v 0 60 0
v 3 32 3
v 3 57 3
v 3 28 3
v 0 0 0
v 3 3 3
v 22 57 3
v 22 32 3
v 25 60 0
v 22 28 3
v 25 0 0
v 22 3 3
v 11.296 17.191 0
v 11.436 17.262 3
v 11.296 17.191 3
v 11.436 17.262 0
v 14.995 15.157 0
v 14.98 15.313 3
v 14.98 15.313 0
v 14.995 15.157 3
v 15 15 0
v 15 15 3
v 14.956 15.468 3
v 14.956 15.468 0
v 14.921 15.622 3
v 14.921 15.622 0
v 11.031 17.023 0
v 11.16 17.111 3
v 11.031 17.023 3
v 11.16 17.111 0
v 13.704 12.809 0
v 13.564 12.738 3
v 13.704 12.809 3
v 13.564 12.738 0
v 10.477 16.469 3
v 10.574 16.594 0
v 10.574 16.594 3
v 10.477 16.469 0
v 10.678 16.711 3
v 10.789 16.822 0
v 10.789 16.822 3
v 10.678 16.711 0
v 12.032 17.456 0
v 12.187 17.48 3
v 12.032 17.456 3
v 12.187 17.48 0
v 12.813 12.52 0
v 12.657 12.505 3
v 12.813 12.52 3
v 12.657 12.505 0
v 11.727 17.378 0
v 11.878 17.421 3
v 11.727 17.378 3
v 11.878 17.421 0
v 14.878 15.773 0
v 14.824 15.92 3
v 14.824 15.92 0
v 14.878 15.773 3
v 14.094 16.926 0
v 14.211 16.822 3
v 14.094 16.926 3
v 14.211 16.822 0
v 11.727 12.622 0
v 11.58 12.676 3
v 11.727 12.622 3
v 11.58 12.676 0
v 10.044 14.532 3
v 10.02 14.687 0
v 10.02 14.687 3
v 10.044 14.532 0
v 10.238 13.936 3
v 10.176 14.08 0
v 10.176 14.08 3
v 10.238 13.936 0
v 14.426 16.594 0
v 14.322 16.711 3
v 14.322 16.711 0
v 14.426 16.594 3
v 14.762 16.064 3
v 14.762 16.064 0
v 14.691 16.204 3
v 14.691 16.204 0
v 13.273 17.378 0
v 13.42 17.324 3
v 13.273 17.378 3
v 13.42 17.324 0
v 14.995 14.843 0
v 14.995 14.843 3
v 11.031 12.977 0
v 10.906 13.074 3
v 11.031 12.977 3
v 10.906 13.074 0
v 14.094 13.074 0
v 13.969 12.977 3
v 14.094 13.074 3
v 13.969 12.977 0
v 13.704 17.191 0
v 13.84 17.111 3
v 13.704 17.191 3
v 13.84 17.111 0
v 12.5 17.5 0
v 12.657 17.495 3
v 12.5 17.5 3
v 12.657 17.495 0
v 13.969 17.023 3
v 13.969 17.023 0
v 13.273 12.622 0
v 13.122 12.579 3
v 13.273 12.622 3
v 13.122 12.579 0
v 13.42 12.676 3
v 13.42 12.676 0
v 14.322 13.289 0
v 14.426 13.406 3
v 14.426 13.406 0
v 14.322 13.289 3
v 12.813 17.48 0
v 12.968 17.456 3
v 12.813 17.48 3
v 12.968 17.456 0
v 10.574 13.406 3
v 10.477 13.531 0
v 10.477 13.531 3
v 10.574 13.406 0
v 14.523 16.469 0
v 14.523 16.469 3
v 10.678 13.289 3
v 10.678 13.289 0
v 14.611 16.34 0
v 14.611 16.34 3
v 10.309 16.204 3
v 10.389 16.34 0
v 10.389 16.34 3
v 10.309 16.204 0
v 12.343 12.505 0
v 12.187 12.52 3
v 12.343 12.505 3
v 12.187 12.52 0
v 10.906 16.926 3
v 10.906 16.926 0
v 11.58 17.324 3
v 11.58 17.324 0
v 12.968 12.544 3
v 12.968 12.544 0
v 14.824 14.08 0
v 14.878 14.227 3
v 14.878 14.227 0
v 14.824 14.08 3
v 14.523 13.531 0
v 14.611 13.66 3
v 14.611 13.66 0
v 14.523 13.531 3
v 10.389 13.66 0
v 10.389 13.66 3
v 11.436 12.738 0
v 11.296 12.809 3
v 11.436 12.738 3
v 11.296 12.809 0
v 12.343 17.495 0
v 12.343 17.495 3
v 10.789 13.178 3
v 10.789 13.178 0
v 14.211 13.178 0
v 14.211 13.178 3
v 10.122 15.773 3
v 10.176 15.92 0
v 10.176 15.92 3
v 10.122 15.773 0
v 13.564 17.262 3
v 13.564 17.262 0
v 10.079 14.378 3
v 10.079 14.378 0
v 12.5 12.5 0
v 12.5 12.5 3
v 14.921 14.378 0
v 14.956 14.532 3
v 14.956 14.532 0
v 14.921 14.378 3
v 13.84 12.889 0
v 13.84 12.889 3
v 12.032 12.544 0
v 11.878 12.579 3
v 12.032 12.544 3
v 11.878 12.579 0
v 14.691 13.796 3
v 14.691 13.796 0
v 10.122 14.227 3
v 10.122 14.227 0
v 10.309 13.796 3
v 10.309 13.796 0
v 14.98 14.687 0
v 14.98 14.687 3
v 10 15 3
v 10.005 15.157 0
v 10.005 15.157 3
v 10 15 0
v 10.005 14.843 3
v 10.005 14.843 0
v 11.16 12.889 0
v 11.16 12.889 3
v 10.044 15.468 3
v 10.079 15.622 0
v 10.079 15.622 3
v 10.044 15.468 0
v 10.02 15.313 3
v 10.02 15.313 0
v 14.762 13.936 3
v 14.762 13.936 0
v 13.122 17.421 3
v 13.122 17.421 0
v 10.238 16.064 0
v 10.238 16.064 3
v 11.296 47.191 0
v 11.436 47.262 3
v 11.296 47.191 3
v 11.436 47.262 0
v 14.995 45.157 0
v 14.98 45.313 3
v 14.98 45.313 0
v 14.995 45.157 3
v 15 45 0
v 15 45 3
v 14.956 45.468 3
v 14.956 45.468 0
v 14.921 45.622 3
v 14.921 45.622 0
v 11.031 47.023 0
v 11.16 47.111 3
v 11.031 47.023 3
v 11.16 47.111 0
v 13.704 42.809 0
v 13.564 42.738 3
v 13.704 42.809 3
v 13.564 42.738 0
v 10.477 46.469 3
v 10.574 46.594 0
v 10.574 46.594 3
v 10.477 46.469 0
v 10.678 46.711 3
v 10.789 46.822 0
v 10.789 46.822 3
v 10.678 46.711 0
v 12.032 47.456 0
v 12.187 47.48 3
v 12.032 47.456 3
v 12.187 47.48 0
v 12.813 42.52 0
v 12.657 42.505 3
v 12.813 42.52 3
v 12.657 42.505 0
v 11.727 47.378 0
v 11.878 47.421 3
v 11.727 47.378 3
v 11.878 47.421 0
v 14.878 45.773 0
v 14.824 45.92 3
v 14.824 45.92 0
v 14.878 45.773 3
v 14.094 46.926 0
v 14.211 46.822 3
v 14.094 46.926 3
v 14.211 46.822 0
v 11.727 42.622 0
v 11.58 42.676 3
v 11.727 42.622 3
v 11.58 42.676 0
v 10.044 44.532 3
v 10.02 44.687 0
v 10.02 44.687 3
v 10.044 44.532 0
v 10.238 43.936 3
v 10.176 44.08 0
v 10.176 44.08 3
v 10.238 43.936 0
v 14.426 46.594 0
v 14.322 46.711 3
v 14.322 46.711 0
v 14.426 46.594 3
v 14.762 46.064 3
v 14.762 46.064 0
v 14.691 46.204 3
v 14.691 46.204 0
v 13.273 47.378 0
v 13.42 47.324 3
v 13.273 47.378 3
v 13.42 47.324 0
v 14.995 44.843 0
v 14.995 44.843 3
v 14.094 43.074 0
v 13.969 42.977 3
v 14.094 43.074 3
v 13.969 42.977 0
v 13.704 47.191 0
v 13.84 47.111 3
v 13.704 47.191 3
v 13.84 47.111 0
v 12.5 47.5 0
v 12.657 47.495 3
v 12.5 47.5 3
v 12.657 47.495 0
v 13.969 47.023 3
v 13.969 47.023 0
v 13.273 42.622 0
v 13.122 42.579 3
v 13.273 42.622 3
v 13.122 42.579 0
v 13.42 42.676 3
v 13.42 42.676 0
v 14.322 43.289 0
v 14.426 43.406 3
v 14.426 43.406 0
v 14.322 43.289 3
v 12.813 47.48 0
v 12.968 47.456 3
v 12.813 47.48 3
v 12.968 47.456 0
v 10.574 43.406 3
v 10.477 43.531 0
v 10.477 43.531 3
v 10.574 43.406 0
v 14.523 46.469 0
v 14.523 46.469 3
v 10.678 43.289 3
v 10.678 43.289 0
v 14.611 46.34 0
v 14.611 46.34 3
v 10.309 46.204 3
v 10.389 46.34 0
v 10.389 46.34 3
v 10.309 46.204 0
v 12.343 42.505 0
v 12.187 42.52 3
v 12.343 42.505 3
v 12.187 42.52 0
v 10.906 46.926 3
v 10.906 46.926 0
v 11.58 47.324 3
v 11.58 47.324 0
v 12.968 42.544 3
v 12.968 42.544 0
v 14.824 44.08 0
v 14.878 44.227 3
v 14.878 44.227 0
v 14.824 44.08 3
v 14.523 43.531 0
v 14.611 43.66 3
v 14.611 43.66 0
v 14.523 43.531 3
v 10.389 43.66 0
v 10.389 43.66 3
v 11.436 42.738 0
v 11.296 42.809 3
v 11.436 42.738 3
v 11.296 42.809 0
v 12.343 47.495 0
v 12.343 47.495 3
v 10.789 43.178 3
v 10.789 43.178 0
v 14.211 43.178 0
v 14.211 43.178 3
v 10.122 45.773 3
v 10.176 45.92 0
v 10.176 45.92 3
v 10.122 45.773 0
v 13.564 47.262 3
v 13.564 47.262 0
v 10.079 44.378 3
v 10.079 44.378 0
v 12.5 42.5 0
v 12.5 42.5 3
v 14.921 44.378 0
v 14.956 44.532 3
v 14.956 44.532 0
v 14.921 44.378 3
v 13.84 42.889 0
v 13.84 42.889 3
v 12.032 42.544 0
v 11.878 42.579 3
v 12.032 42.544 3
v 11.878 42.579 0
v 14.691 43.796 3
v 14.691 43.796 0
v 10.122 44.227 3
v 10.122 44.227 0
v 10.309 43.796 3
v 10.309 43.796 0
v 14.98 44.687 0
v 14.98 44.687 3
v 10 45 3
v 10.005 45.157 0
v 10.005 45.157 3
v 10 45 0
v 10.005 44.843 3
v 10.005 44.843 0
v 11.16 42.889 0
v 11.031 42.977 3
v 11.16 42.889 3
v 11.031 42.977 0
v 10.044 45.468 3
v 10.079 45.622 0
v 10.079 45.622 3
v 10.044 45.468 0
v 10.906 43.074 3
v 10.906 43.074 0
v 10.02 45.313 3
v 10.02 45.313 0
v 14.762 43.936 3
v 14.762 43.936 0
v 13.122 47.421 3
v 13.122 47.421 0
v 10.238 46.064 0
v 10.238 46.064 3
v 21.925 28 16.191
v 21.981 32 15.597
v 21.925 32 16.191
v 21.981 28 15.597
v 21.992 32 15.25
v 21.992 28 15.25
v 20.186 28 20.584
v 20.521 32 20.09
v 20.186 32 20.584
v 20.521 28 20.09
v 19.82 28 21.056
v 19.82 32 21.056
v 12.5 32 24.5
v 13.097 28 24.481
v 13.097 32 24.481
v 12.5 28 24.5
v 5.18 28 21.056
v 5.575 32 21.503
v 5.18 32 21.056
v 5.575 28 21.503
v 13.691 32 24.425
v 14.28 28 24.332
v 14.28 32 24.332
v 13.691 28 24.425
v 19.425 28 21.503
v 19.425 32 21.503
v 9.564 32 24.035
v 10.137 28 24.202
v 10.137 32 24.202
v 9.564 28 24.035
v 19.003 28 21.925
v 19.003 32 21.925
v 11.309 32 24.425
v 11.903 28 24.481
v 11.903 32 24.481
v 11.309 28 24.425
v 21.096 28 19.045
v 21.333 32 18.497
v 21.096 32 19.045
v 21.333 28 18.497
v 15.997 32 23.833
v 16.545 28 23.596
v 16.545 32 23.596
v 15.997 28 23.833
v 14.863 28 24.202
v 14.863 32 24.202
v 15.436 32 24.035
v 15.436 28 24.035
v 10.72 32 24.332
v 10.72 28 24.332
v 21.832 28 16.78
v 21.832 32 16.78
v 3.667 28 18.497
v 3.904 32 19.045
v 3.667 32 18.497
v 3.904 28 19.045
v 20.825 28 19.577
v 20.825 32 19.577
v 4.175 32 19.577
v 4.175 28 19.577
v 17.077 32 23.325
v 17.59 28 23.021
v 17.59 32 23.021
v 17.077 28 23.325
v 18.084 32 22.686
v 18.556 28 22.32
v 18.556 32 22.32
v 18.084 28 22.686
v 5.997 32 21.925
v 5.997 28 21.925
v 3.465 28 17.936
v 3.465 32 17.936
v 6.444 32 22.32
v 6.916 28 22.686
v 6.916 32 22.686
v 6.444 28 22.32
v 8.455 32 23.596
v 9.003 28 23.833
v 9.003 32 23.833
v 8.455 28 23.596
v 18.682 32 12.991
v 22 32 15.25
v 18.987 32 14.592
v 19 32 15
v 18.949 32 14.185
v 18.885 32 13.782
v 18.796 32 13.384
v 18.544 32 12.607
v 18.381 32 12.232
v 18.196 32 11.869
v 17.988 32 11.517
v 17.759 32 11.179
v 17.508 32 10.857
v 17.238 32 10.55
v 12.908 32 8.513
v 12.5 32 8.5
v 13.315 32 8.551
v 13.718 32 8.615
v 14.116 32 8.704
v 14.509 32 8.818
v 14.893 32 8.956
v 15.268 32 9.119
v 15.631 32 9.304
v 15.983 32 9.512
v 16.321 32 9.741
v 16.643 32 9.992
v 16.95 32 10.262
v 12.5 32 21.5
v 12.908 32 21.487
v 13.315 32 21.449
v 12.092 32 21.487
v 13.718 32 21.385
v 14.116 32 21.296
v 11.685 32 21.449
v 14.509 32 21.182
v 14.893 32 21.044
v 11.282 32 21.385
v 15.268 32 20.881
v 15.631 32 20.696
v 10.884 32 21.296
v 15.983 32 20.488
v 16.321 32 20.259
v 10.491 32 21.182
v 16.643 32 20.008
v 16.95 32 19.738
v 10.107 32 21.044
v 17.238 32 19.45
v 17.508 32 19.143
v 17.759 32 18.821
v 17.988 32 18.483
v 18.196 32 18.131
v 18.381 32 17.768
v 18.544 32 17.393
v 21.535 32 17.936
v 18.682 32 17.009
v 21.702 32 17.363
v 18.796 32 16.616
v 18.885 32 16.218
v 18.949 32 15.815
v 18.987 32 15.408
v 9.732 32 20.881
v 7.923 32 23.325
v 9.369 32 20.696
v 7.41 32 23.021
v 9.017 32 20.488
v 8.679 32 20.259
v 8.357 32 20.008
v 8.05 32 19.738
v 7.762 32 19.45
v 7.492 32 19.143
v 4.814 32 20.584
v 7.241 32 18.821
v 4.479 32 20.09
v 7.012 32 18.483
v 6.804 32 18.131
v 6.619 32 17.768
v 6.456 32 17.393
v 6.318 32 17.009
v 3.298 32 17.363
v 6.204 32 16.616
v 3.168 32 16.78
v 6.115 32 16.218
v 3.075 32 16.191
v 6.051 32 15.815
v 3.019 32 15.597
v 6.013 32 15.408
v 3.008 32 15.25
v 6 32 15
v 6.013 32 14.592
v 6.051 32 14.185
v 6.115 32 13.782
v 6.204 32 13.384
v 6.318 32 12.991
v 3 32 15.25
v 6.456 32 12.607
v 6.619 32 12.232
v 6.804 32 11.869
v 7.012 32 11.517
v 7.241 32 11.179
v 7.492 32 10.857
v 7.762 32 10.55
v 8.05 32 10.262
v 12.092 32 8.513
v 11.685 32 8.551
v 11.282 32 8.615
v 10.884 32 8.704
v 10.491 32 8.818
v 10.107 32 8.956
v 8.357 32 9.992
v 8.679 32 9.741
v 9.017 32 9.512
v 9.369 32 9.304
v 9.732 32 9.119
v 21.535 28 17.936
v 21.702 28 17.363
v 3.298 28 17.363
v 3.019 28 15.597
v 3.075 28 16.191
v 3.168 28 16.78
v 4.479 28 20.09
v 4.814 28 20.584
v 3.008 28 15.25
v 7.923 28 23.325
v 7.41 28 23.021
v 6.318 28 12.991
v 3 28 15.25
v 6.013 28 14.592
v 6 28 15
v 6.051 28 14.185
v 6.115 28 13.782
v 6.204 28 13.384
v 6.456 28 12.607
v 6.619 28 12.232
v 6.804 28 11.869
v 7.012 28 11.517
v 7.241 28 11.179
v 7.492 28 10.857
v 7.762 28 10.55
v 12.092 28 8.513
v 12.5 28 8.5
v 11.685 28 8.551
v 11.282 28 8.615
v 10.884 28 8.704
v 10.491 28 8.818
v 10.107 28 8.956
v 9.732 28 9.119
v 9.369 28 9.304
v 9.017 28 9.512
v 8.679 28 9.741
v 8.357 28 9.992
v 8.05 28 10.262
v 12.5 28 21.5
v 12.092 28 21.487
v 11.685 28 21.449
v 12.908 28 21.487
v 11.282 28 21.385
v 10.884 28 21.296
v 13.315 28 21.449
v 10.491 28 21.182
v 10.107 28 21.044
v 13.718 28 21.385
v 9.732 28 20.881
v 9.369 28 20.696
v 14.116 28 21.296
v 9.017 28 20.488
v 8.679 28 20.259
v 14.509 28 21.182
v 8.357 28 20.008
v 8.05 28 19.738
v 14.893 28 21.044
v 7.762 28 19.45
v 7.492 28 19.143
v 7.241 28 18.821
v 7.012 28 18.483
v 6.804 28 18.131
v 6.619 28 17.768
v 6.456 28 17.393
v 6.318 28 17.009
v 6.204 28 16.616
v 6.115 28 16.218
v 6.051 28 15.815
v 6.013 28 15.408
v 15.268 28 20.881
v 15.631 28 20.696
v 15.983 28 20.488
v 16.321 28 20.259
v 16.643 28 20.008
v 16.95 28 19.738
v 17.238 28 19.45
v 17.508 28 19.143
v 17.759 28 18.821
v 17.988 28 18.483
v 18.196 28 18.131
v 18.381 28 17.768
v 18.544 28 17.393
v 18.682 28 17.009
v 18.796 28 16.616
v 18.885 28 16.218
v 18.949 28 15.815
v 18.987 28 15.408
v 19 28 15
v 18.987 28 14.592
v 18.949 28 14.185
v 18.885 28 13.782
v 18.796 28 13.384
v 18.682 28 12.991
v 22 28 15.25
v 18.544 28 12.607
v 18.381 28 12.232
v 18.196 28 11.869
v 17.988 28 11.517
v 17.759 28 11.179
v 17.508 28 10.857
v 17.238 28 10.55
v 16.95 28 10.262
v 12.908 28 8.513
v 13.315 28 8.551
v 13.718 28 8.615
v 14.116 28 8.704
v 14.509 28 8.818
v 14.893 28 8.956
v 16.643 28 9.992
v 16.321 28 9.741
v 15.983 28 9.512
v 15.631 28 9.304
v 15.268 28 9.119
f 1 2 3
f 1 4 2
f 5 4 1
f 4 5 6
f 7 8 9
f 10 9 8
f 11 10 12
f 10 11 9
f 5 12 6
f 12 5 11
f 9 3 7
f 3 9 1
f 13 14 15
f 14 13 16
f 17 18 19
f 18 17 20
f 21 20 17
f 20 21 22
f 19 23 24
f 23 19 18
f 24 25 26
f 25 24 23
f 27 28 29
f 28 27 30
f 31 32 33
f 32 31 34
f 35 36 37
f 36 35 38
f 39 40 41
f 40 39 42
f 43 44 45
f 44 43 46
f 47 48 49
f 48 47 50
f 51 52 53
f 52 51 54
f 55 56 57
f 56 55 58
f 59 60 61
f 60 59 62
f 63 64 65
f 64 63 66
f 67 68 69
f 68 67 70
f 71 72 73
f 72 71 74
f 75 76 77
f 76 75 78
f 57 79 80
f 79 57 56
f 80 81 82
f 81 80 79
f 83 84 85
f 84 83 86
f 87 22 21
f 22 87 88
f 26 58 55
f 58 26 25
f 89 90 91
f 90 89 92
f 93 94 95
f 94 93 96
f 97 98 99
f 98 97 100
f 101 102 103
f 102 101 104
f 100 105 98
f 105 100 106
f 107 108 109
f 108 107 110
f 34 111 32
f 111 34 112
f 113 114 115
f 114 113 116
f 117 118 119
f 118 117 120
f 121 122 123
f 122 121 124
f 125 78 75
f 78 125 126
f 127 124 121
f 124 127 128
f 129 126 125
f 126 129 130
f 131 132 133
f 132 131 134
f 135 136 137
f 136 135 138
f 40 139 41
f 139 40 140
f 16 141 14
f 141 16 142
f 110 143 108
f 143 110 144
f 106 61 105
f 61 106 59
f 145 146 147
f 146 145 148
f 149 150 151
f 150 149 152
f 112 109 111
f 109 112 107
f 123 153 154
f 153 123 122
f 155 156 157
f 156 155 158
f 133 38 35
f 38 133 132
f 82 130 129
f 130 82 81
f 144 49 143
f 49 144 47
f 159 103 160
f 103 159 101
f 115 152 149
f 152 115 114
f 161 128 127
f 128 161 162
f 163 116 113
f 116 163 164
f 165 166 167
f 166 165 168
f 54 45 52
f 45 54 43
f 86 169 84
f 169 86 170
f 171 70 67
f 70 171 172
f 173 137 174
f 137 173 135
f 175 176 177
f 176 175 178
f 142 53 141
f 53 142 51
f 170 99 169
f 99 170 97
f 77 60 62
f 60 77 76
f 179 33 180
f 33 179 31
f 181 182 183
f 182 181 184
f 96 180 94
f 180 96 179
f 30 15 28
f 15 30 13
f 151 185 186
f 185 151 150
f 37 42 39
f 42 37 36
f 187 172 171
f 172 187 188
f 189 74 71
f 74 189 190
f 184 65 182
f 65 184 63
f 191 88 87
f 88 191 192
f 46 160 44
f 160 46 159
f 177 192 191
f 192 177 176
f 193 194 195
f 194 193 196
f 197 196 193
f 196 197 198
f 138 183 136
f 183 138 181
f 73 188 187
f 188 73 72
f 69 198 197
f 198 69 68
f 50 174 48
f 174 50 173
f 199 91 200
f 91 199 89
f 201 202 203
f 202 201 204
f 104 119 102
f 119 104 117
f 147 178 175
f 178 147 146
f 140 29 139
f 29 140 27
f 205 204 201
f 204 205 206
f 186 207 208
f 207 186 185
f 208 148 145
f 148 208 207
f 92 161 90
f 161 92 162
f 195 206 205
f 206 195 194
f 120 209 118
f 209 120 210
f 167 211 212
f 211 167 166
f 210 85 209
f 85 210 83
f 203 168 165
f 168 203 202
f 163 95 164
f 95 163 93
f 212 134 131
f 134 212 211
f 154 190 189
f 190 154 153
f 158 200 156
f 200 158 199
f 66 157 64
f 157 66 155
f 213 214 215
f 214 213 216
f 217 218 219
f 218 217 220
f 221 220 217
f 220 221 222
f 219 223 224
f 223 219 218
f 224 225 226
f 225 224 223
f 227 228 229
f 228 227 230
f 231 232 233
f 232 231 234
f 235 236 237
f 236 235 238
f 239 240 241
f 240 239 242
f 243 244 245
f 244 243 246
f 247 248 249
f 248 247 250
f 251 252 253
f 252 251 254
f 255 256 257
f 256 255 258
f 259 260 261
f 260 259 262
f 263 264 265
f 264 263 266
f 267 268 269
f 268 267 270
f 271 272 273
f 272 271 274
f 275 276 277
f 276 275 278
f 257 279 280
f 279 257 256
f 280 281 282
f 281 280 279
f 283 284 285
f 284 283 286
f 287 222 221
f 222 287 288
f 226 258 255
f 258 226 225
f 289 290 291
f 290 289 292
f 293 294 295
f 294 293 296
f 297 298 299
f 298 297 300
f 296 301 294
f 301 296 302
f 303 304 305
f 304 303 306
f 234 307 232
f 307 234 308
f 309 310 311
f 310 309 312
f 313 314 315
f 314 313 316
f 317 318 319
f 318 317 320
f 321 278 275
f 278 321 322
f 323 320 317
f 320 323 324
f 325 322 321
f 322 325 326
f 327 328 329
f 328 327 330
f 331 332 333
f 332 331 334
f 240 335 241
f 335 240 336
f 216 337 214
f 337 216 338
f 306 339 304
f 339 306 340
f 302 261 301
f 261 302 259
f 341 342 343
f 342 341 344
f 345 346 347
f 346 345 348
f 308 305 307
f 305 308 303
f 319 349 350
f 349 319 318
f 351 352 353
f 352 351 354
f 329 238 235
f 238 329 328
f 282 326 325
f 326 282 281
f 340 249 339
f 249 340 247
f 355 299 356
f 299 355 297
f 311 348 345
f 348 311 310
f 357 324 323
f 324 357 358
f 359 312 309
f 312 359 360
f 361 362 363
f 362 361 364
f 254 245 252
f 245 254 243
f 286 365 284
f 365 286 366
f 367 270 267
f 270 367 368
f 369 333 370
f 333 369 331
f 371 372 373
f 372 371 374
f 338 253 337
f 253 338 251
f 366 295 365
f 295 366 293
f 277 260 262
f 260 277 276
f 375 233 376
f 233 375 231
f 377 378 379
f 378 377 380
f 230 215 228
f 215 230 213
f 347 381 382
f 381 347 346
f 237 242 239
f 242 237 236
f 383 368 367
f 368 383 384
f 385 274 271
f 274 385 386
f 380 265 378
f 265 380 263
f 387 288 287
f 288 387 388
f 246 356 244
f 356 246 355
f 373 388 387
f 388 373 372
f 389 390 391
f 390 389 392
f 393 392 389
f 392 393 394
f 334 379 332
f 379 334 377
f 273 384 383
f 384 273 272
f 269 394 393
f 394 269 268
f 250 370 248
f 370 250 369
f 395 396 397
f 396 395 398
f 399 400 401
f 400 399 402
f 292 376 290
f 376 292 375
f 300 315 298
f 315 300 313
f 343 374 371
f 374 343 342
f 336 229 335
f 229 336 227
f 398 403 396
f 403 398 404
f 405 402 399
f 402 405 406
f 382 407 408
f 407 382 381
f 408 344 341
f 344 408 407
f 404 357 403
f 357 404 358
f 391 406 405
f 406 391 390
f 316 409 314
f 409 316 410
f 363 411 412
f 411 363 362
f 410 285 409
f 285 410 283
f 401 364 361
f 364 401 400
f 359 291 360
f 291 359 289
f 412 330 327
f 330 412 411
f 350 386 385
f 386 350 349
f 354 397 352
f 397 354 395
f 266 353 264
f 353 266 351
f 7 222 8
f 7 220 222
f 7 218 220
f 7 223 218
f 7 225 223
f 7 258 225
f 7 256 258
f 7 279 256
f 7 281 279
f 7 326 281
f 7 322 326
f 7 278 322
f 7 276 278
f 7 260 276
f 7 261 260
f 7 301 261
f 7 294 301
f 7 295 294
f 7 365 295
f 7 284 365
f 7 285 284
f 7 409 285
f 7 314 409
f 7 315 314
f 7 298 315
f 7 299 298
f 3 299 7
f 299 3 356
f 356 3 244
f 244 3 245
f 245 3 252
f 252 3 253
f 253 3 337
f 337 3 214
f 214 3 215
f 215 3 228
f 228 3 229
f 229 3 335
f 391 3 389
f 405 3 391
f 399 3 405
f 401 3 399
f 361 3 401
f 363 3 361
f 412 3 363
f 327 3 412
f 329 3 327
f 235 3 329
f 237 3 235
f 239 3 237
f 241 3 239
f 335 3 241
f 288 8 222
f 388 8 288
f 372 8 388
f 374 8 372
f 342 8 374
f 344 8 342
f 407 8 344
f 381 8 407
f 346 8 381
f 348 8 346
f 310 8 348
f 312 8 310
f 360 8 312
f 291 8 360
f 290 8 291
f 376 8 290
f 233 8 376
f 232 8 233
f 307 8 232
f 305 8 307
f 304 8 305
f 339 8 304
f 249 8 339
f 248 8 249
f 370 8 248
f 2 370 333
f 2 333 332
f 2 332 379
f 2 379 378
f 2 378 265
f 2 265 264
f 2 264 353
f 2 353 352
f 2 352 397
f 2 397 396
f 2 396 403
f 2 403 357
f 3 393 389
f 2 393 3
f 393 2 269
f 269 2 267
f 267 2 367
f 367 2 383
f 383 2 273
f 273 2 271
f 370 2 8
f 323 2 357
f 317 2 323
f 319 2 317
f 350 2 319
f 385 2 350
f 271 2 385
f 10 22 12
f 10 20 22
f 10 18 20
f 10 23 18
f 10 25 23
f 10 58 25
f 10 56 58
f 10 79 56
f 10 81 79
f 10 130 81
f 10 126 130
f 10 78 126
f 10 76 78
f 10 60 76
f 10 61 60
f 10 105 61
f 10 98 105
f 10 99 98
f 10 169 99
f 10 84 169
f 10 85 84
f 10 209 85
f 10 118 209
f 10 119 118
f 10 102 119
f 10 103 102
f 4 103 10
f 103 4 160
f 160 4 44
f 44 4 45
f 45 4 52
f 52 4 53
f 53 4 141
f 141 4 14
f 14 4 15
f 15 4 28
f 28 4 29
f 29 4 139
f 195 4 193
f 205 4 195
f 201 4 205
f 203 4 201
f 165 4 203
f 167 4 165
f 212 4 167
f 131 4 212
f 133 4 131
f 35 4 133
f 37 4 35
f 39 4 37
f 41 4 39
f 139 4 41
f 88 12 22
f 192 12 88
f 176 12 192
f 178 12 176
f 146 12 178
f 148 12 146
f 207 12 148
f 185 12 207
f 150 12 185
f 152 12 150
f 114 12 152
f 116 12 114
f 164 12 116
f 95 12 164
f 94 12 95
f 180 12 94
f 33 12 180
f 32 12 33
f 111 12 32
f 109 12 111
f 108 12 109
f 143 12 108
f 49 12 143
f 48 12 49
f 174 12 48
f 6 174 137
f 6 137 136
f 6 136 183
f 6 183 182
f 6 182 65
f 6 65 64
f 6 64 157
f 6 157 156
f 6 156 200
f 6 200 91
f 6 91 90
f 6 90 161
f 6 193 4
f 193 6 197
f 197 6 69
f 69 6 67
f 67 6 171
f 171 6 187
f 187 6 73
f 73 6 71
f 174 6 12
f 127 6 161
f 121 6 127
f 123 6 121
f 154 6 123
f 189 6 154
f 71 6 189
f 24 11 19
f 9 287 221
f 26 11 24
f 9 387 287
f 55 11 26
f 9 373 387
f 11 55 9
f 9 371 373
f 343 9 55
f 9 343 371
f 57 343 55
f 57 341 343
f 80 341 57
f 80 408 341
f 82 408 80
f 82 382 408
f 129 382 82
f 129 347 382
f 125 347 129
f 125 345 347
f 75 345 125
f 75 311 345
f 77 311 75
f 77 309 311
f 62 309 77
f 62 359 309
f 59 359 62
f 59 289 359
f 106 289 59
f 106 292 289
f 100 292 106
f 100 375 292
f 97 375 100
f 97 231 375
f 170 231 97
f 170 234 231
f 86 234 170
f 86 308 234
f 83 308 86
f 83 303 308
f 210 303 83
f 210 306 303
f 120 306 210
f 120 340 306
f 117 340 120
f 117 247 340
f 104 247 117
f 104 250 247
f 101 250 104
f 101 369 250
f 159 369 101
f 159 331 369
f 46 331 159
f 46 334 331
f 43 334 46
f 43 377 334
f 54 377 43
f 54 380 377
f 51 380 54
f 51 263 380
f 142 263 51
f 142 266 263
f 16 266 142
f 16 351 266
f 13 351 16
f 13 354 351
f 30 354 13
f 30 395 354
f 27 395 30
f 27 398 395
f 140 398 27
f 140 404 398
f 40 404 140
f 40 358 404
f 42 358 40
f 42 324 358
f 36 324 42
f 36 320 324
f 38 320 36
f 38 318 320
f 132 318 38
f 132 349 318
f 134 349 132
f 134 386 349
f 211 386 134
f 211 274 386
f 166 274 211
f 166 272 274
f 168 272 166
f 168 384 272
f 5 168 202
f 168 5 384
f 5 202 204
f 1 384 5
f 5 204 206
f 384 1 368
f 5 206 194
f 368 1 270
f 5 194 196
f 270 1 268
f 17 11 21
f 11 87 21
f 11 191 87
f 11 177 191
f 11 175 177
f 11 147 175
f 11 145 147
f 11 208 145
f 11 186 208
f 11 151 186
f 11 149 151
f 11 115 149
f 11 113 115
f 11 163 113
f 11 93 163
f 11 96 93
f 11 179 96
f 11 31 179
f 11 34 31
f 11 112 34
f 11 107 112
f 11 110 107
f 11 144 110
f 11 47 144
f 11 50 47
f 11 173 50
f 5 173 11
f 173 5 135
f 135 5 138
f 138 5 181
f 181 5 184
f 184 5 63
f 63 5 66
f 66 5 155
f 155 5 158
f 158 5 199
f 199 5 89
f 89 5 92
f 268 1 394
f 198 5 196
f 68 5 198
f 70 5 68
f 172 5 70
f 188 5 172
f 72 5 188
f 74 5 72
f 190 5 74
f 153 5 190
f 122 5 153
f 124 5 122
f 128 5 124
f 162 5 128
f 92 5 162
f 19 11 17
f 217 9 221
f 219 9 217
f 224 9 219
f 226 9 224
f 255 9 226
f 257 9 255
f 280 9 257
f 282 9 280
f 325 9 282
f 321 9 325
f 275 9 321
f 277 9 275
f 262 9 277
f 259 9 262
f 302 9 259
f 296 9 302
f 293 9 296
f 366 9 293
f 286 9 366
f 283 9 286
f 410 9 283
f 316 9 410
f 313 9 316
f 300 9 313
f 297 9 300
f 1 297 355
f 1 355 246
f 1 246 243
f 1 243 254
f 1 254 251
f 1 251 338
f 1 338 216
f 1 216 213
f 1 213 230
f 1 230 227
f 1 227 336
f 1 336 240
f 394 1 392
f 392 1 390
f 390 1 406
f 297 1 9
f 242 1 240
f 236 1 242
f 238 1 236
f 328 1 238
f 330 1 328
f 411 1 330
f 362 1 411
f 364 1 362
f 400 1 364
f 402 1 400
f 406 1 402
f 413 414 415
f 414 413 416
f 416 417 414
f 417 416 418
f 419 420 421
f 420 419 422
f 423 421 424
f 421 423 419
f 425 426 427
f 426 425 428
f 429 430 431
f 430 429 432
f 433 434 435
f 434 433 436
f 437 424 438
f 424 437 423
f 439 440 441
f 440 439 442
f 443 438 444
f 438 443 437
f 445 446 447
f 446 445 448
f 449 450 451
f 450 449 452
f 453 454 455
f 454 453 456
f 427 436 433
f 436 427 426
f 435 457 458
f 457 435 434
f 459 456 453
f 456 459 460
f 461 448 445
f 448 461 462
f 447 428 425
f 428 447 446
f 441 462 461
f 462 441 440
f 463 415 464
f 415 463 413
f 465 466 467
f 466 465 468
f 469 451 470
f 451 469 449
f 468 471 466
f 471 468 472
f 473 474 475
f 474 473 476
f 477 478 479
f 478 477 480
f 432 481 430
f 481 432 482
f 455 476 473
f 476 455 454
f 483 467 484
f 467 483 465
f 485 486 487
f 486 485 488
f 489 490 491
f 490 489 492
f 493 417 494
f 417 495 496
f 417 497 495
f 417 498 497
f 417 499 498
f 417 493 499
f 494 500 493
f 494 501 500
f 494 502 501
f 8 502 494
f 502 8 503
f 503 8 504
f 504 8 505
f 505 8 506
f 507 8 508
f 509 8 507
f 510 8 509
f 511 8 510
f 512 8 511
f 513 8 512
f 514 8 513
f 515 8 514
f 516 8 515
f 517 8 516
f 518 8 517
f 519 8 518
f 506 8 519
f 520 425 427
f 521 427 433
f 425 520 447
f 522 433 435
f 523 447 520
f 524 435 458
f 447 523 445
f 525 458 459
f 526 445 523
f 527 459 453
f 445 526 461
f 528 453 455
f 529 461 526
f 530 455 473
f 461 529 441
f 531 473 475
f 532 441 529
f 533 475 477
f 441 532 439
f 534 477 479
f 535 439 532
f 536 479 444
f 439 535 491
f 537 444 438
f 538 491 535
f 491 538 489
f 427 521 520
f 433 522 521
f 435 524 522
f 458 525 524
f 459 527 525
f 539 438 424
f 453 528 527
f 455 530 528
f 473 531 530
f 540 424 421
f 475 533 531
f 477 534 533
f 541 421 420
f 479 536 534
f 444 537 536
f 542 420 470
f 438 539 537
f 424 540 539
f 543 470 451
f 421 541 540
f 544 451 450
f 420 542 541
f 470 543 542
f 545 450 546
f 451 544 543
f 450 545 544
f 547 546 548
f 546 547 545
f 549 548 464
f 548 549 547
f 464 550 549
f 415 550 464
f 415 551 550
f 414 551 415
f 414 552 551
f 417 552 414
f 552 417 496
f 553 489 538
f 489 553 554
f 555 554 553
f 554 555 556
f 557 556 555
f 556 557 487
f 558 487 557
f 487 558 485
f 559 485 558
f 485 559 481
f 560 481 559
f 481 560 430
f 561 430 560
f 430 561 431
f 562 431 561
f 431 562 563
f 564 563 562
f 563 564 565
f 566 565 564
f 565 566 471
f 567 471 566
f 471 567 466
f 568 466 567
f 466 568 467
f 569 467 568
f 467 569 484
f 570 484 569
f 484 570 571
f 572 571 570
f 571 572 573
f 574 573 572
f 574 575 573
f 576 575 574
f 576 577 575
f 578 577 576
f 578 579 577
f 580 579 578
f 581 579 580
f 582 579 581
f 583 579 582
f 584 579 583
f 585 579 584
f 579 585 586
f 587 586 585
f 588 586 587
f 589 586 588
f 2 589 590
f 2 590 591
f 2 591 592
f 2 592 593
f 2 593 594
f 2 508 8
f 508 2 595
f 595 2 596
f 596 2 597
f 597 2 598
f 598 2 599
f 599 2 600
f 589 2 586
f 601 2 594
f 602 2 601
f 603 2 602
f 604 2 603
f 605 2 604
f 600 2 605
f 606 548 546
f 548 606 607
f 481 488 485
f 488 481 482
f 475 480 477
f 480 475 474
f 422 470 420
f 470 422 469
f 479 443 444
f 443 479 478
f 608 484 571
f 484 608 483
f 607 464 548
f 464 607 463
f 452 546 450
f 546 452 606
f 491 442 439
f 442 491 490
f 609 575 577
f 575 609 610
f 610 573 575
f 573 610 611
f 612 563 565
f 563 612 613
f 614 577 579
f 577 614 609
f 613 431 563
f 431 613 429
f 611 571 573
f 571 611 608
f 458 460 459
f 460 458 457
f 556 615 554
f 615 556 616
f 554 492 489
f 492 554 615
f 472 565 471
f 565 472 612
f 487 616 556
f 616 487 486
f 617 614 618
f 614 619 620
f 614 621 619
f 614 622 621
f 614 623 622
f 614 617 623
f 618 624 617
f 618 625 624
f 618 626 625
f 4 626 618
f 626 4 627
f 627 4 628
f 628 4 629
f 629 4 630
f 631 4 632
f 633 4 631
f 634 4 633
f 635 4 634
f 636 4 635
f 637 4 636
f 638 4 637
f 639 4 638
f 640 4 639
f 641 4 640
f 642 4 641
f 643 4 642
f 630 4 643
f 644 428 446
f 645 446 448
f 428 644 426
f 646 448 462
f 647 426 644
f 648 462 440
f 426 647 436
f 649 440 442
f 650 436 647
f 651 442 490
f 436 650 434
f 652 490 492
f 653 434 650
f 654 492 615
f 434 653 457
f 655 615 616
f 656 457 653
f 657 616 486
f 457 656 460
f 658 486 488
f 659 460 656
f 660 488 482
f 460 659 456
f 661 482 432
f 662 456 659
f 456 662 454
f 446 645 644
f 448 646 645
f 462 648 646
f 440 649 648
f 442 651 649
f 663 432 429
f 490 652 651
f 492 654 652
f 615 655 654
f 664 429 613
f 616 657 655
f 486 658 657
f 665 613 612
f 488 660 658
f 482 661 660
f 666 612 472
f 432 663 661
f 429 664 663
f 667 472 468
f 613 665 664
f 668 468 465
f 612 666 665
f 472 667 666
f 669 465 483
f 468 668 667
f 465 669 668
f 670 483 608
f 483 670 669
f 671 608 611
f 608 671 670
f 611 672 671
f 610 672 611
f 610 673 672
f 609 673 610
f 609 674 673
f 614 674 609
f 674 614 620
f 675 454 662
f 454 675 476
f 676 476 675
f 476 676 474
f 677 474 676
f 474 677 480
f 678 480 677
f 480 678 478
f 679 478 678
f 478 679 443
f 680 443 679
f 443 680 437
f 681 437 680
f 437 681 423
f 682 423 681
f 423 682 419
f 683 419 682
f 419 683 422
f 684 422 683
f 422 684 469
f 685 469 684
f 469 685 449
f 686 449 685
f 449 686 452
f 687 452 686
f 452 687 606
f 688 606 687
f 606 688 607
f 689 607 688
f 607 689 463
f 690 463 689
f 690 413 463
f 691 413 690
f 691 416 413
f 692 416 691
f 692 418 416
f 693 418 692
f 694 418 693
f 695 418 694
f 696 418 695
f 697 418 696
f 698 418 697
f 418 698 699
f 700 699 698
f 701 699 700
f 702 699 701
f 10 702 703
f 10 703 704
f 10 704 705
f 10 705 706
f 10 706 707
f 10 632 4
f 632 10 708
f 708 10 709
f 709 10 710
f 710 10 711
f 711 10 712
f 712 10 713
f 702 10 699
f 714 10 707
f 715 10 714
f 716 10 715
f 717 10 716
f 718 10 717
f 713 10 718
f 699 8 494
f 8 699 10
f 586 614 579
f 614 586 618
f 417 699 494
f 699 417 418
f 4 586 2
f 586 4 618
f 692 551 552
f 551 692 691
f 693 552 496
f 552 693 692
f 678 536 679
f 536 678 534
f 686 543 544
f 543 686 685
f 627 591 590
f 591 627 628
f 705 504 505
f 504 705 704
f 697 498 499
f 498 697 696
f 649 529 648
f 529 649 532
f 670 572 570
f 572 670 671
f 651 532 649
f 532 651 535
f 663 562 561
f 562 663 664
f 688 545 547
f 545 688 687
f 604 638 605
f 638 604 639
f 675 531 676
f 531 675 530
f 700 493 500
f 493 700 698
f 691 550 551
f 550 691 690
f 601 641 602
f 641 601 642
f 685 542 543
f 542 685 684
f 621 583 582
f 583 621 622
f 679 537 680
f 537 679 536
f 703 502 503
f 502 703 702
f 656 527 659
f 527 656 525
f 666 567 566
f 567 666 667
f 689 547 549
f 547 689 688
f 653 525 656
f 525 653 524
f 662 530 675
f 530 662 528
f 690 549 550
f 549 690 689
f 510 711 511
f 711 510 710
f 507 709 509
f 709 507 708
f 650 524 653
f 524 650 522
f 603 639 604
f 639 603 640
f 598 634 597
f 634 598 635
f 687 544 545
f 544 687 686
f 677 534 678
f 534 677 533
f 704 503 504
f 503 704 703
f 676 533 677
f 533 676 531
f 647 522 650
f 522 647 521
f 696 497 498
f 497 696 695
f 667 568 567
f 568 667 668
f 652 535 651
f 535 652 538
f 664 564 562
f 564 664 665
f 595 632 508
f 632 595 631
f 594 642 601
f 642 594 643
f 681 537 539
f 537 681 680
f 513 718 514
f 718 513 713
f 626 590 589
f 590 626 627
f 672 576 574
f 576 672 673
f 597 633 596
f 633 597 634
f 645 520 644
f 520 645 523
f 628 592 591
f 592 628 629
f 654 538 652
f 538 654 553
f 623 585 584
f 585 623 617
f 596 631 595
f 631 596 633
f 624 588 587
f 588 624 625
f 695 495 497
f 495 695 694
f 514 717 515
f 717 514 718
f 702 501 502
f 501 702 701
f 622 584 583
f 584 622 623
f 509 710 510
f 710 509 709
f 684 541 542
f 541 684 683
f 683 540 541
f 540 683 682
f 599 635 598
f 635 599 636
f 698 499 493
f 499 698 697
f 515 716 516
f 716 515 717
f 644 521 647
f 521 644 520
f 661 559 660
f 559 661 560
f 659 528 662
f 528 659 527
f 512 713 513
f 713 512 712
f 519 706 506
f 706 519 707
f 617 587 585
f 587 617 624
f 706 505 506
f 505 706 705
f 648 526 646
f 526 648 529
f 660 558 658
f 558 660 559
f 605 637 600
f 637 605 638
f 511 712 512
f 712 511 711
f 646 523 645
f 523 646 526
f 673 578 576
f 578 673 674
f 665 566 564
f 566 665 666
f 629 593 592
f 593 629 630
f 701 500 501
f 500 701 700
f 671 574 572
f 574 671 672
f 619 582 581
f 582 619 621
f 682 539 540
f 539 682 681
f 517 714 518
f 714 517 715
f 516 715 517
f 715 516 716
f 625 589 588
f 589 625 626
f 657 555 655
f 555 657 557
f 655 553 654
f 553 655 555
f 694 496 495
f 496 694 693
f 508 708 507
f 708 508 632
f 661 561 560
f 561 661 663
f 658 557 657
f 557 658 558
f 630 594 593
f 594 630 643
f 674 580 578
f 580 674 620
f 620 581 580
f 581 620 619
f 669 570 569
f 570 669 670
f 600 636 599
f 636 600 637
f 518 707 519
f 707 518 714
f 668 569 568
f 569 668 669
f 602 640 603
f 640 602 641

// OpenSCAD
//Timbers Antenna holder

antennaDiam = 13;
screwDiam = 5;
height = 60;
width = 25;
thickness = 3;

module backplate(){
    difference(){
        union(){
            cube([width, height, thickness]);
        }
    
        union(){
            translate([0, 0, 0])
            rotate([0, -45, 0])
            cube([thickness * 2, height, thickness * 2]);
            translate([width, 0, 0])
            rotate([0, -45, 0])
            cube([thickness * 2, height, thickness * 2]);
            
            translate([0, 0, 0])
            rotate([45, 0, 0])
            cube([width, thickness*2, thickness * 2]);
            translate([0, height, 0])
            rotate([45, 0, 0])
            cube([width, thickness*2, thickness * 2]);
            
            translate([width/2, height/4])
            cylinder(10, screwDiam/2, screwDiam/2, $fn = 100, true);
            translate([width/2, 3*height/4])
            cylinder(10, screwDiam/2, screwDiam/2, $fn = 100, true);
        }
    }
}

module antennaMount(){
    difference(){
        union(){
            translate([width/2, height/2, 15])
            rotate([90, 0, 0])
            cylinder(thickness+1, antennaDiam/2 + 3, antennaDiam/2 + 3, $fn = 100, true);
            
            translate([width/2, height/2, 9])
            cube([antennaDiam + 6, thickness + 1, antennaDiam + 6 - antennaDiam/2], true);
        }
        
        union(){
            translate([width/2, height/2, 15])
            rotate([90, 0, 0])
            cylinder(thickness + 5, antennaDiam/2, antennaDiam/2, $fn = 100, true);
        }
    }
}








module main(){
    
    backplate();
    antennaMount();
    
}main();
